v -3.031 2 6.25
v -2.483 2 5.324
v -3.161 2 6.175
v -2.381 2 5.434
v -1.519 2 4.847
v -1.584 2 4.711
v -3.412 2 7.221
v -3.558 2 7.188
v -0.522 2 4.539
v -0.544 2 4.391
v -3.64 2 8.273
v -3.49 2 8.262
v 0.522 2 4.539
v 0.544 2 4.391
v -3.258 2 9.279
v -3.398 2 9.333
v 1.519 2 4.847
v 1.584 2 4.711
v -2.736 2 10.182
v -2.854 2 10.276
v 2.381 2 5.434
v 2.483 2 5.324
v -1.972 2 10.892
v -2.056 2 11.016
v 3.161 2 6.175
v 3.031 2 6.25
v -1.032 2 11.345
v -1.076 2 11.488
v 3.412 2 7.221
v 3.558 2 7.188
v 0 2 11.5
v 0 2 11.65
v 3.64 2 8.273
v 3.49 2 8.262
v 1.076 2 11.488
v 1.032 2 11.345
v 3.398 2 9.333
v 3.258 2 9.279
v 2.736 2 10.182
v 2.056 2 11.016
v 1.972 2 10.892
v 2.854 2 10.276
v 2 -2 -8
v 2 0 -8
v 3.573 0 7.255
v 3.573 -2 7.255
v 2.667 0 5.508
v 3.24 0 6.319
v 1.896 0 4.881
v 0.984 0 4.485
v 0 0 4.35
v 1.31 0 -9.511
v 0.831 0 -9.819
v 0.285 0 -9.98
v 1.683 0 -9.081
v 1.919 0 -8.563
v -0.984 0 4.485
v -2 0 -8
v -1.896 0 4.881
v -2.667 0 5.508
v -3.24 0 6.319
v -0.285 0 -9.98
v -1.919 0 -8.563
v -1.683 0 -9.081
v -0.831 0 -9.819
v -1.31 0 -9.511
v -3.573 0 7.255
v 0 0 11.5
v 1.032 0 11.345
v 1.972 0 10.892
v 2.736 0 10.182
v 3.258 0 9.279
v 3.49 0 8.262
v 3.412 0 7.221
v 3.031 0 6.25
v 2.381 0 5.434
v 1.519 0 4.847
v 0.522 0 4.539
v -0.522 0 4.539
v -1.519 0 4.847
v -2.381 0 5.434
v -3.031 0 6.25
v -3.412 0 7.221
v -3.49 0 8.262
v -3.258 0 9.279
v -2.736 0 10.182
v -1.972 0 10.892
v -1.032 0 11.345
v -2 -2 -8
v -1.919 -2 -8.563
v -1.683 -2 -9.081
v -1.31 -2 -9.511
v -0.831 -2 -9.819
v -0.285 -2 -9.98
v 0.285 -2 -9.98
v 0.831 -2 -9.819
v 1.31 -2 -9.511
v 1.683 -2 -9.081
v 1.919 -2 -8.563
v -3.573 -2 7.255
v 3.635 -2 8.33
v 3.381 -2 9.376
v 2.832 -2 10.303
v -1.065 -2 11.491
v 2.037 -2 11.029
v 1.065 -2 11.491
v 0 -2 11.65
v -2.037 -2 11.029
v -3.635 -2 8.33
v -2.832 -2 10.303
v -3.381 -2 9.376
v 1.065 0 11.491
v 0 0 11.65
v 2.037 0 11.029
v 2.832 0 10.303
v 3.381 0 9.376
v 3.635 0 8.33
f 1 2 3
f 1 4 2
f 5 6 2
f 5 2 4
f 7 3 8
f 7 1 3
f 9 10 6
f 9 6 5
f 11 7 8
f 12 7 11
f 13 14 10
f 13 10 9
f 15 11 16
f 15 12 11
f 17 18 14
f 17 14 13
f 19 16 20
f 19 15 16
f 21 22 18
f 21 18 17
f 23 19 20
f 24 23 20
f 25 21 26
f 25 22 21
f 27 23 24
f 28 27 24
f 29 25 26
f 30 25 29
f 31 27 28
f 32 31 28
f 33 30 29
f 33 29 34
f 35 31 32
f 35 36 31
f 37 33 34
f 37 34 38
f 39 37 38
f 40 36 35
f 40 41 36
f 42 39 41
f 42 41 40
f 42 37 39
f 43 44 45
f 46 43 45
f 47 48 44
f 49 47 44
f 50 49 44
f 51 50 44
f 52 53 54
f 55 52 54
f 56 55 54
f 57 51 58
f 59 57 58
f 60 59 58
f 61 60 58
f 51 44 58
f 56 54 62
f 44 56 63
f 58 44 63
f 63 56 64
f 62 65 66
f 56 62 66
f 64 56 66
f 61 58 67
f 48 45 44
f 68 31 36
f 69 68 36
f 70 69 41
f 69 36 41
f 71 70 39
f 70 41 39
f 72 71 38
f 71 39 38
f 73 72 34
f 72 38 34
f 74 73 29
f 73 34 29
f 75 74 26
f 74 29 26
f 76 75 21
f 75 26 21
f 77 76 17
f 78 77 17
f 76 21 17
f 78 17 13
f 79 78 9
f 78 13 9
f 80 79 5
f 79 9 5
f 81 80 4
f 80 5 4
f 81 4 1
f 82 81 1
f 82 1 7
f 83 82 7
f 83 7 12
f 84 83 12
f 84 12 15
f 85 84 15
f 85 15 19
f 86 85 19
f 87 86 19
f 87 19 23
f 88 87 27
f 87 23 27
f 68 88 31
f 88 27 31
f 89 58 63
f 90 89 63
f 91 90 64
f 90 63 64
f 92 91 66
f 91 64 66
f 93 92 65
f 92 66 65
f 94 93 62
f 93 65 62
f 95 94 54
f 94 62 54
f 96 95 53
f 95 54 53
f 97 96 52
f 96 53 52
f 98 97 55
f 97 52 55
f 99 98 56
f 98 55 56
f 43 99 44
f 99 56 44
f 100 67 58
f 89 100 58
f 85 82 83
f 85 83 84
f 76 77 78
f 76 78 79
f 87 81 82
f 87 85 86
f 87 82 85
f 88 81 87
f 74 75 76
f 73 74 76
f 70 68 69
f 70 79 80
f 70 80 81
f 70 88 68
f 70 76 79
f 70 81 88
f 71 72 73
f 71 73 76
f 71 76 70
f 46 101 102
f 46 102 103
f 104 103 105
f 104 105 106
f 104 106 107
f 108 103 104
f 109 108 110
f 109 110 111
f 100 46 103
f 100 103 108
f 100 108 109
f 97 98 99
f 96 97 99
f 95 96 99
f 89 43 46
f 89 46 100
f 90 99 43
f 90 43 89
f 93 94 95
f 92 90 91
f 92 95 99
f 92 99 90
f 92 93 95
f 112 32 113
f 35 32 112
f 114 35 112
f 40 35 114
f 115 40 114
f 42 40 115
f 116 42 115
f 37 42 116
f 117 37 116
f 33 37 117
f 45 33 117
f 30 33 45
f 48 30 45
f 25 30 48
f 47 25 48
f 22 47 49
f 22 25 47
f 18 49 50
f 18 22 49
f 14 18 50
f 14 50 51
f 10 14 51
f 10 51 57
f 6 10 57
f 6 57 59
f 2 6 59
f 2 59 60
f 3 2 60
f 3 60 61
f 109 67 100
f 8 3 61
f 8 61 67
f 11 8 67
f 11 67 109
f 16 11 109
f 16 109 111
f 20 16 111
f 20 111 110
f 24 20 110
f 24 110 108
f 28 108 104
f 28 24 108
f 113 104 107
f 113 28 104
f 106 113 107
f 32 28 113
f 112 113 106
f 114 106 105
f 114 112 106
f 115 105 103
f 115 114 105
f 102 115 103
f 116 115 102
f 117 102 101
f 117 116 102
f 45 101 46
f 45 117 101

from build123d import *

# Parameters (mm, degrees)
BOSS_EXTRUDE1_DEPTH = 2
BOSS_EXTRUDE2_START = 2
SKETCH2_R           = 3.65
BOSS_EXTRUDE2_DEPTH = 2
SKETCH3_R           = 3.5
CUT_EXTRUDE1_DEPTH  = 2


with BuildPart() as part:
    # Sketch1 → Boss-Extrude1 (new body)
    with BuildSketch(Plane(origin=(0, 0, 0), x_dir=(1, 0, 0), z_dir=(0, 1, 0))):
        with BuildLine():
            Line((-3.57318314, -7.255109239), (-2, 8))
            ThreePointArc((-2, 8), (0, 10), (2, 8))
            Line((2, 8), (3.57318314, -7.255109239))
            ThreePointArc((3.57318314, -7.255109239), (0, -11.65), (-3.57318314, -7.255109239))
        make_face()
    extrude(amount=-BOSS_EXTRUDE1_DEPTH)

    # Sketch2 → Boss-Extrude2 (add)
    with BuildSketch(Plane(origin=(0, 0, 0), x_dir=(1, 0, 0), z_dir=(0, 1, 0)).offset(BOSS_EXTRUDE2_START)):
        with Locations(Location((0, -8, 0), (0, 0, 270))):
            Circle(SKETCH2_R)
    extrude(amount=-BOSS_EXTRUDE2_DEPTH)

    # Sketch3 → Cut-Extrude1 (cut)
    with BuildSketch(Plane(origin=(0, 2, 0), x_dir=(1, 0, 0), z_dir=(0, 1, 0))):
        with Locations(Location((0, -8, 0), (0, 0, 270))):
            Circle(SKETCH3_R)
    extrude(amount=-CUT_EXTRUDE1_DEPTH, mode=Mode.SUBTRACT)


solid = part.part
